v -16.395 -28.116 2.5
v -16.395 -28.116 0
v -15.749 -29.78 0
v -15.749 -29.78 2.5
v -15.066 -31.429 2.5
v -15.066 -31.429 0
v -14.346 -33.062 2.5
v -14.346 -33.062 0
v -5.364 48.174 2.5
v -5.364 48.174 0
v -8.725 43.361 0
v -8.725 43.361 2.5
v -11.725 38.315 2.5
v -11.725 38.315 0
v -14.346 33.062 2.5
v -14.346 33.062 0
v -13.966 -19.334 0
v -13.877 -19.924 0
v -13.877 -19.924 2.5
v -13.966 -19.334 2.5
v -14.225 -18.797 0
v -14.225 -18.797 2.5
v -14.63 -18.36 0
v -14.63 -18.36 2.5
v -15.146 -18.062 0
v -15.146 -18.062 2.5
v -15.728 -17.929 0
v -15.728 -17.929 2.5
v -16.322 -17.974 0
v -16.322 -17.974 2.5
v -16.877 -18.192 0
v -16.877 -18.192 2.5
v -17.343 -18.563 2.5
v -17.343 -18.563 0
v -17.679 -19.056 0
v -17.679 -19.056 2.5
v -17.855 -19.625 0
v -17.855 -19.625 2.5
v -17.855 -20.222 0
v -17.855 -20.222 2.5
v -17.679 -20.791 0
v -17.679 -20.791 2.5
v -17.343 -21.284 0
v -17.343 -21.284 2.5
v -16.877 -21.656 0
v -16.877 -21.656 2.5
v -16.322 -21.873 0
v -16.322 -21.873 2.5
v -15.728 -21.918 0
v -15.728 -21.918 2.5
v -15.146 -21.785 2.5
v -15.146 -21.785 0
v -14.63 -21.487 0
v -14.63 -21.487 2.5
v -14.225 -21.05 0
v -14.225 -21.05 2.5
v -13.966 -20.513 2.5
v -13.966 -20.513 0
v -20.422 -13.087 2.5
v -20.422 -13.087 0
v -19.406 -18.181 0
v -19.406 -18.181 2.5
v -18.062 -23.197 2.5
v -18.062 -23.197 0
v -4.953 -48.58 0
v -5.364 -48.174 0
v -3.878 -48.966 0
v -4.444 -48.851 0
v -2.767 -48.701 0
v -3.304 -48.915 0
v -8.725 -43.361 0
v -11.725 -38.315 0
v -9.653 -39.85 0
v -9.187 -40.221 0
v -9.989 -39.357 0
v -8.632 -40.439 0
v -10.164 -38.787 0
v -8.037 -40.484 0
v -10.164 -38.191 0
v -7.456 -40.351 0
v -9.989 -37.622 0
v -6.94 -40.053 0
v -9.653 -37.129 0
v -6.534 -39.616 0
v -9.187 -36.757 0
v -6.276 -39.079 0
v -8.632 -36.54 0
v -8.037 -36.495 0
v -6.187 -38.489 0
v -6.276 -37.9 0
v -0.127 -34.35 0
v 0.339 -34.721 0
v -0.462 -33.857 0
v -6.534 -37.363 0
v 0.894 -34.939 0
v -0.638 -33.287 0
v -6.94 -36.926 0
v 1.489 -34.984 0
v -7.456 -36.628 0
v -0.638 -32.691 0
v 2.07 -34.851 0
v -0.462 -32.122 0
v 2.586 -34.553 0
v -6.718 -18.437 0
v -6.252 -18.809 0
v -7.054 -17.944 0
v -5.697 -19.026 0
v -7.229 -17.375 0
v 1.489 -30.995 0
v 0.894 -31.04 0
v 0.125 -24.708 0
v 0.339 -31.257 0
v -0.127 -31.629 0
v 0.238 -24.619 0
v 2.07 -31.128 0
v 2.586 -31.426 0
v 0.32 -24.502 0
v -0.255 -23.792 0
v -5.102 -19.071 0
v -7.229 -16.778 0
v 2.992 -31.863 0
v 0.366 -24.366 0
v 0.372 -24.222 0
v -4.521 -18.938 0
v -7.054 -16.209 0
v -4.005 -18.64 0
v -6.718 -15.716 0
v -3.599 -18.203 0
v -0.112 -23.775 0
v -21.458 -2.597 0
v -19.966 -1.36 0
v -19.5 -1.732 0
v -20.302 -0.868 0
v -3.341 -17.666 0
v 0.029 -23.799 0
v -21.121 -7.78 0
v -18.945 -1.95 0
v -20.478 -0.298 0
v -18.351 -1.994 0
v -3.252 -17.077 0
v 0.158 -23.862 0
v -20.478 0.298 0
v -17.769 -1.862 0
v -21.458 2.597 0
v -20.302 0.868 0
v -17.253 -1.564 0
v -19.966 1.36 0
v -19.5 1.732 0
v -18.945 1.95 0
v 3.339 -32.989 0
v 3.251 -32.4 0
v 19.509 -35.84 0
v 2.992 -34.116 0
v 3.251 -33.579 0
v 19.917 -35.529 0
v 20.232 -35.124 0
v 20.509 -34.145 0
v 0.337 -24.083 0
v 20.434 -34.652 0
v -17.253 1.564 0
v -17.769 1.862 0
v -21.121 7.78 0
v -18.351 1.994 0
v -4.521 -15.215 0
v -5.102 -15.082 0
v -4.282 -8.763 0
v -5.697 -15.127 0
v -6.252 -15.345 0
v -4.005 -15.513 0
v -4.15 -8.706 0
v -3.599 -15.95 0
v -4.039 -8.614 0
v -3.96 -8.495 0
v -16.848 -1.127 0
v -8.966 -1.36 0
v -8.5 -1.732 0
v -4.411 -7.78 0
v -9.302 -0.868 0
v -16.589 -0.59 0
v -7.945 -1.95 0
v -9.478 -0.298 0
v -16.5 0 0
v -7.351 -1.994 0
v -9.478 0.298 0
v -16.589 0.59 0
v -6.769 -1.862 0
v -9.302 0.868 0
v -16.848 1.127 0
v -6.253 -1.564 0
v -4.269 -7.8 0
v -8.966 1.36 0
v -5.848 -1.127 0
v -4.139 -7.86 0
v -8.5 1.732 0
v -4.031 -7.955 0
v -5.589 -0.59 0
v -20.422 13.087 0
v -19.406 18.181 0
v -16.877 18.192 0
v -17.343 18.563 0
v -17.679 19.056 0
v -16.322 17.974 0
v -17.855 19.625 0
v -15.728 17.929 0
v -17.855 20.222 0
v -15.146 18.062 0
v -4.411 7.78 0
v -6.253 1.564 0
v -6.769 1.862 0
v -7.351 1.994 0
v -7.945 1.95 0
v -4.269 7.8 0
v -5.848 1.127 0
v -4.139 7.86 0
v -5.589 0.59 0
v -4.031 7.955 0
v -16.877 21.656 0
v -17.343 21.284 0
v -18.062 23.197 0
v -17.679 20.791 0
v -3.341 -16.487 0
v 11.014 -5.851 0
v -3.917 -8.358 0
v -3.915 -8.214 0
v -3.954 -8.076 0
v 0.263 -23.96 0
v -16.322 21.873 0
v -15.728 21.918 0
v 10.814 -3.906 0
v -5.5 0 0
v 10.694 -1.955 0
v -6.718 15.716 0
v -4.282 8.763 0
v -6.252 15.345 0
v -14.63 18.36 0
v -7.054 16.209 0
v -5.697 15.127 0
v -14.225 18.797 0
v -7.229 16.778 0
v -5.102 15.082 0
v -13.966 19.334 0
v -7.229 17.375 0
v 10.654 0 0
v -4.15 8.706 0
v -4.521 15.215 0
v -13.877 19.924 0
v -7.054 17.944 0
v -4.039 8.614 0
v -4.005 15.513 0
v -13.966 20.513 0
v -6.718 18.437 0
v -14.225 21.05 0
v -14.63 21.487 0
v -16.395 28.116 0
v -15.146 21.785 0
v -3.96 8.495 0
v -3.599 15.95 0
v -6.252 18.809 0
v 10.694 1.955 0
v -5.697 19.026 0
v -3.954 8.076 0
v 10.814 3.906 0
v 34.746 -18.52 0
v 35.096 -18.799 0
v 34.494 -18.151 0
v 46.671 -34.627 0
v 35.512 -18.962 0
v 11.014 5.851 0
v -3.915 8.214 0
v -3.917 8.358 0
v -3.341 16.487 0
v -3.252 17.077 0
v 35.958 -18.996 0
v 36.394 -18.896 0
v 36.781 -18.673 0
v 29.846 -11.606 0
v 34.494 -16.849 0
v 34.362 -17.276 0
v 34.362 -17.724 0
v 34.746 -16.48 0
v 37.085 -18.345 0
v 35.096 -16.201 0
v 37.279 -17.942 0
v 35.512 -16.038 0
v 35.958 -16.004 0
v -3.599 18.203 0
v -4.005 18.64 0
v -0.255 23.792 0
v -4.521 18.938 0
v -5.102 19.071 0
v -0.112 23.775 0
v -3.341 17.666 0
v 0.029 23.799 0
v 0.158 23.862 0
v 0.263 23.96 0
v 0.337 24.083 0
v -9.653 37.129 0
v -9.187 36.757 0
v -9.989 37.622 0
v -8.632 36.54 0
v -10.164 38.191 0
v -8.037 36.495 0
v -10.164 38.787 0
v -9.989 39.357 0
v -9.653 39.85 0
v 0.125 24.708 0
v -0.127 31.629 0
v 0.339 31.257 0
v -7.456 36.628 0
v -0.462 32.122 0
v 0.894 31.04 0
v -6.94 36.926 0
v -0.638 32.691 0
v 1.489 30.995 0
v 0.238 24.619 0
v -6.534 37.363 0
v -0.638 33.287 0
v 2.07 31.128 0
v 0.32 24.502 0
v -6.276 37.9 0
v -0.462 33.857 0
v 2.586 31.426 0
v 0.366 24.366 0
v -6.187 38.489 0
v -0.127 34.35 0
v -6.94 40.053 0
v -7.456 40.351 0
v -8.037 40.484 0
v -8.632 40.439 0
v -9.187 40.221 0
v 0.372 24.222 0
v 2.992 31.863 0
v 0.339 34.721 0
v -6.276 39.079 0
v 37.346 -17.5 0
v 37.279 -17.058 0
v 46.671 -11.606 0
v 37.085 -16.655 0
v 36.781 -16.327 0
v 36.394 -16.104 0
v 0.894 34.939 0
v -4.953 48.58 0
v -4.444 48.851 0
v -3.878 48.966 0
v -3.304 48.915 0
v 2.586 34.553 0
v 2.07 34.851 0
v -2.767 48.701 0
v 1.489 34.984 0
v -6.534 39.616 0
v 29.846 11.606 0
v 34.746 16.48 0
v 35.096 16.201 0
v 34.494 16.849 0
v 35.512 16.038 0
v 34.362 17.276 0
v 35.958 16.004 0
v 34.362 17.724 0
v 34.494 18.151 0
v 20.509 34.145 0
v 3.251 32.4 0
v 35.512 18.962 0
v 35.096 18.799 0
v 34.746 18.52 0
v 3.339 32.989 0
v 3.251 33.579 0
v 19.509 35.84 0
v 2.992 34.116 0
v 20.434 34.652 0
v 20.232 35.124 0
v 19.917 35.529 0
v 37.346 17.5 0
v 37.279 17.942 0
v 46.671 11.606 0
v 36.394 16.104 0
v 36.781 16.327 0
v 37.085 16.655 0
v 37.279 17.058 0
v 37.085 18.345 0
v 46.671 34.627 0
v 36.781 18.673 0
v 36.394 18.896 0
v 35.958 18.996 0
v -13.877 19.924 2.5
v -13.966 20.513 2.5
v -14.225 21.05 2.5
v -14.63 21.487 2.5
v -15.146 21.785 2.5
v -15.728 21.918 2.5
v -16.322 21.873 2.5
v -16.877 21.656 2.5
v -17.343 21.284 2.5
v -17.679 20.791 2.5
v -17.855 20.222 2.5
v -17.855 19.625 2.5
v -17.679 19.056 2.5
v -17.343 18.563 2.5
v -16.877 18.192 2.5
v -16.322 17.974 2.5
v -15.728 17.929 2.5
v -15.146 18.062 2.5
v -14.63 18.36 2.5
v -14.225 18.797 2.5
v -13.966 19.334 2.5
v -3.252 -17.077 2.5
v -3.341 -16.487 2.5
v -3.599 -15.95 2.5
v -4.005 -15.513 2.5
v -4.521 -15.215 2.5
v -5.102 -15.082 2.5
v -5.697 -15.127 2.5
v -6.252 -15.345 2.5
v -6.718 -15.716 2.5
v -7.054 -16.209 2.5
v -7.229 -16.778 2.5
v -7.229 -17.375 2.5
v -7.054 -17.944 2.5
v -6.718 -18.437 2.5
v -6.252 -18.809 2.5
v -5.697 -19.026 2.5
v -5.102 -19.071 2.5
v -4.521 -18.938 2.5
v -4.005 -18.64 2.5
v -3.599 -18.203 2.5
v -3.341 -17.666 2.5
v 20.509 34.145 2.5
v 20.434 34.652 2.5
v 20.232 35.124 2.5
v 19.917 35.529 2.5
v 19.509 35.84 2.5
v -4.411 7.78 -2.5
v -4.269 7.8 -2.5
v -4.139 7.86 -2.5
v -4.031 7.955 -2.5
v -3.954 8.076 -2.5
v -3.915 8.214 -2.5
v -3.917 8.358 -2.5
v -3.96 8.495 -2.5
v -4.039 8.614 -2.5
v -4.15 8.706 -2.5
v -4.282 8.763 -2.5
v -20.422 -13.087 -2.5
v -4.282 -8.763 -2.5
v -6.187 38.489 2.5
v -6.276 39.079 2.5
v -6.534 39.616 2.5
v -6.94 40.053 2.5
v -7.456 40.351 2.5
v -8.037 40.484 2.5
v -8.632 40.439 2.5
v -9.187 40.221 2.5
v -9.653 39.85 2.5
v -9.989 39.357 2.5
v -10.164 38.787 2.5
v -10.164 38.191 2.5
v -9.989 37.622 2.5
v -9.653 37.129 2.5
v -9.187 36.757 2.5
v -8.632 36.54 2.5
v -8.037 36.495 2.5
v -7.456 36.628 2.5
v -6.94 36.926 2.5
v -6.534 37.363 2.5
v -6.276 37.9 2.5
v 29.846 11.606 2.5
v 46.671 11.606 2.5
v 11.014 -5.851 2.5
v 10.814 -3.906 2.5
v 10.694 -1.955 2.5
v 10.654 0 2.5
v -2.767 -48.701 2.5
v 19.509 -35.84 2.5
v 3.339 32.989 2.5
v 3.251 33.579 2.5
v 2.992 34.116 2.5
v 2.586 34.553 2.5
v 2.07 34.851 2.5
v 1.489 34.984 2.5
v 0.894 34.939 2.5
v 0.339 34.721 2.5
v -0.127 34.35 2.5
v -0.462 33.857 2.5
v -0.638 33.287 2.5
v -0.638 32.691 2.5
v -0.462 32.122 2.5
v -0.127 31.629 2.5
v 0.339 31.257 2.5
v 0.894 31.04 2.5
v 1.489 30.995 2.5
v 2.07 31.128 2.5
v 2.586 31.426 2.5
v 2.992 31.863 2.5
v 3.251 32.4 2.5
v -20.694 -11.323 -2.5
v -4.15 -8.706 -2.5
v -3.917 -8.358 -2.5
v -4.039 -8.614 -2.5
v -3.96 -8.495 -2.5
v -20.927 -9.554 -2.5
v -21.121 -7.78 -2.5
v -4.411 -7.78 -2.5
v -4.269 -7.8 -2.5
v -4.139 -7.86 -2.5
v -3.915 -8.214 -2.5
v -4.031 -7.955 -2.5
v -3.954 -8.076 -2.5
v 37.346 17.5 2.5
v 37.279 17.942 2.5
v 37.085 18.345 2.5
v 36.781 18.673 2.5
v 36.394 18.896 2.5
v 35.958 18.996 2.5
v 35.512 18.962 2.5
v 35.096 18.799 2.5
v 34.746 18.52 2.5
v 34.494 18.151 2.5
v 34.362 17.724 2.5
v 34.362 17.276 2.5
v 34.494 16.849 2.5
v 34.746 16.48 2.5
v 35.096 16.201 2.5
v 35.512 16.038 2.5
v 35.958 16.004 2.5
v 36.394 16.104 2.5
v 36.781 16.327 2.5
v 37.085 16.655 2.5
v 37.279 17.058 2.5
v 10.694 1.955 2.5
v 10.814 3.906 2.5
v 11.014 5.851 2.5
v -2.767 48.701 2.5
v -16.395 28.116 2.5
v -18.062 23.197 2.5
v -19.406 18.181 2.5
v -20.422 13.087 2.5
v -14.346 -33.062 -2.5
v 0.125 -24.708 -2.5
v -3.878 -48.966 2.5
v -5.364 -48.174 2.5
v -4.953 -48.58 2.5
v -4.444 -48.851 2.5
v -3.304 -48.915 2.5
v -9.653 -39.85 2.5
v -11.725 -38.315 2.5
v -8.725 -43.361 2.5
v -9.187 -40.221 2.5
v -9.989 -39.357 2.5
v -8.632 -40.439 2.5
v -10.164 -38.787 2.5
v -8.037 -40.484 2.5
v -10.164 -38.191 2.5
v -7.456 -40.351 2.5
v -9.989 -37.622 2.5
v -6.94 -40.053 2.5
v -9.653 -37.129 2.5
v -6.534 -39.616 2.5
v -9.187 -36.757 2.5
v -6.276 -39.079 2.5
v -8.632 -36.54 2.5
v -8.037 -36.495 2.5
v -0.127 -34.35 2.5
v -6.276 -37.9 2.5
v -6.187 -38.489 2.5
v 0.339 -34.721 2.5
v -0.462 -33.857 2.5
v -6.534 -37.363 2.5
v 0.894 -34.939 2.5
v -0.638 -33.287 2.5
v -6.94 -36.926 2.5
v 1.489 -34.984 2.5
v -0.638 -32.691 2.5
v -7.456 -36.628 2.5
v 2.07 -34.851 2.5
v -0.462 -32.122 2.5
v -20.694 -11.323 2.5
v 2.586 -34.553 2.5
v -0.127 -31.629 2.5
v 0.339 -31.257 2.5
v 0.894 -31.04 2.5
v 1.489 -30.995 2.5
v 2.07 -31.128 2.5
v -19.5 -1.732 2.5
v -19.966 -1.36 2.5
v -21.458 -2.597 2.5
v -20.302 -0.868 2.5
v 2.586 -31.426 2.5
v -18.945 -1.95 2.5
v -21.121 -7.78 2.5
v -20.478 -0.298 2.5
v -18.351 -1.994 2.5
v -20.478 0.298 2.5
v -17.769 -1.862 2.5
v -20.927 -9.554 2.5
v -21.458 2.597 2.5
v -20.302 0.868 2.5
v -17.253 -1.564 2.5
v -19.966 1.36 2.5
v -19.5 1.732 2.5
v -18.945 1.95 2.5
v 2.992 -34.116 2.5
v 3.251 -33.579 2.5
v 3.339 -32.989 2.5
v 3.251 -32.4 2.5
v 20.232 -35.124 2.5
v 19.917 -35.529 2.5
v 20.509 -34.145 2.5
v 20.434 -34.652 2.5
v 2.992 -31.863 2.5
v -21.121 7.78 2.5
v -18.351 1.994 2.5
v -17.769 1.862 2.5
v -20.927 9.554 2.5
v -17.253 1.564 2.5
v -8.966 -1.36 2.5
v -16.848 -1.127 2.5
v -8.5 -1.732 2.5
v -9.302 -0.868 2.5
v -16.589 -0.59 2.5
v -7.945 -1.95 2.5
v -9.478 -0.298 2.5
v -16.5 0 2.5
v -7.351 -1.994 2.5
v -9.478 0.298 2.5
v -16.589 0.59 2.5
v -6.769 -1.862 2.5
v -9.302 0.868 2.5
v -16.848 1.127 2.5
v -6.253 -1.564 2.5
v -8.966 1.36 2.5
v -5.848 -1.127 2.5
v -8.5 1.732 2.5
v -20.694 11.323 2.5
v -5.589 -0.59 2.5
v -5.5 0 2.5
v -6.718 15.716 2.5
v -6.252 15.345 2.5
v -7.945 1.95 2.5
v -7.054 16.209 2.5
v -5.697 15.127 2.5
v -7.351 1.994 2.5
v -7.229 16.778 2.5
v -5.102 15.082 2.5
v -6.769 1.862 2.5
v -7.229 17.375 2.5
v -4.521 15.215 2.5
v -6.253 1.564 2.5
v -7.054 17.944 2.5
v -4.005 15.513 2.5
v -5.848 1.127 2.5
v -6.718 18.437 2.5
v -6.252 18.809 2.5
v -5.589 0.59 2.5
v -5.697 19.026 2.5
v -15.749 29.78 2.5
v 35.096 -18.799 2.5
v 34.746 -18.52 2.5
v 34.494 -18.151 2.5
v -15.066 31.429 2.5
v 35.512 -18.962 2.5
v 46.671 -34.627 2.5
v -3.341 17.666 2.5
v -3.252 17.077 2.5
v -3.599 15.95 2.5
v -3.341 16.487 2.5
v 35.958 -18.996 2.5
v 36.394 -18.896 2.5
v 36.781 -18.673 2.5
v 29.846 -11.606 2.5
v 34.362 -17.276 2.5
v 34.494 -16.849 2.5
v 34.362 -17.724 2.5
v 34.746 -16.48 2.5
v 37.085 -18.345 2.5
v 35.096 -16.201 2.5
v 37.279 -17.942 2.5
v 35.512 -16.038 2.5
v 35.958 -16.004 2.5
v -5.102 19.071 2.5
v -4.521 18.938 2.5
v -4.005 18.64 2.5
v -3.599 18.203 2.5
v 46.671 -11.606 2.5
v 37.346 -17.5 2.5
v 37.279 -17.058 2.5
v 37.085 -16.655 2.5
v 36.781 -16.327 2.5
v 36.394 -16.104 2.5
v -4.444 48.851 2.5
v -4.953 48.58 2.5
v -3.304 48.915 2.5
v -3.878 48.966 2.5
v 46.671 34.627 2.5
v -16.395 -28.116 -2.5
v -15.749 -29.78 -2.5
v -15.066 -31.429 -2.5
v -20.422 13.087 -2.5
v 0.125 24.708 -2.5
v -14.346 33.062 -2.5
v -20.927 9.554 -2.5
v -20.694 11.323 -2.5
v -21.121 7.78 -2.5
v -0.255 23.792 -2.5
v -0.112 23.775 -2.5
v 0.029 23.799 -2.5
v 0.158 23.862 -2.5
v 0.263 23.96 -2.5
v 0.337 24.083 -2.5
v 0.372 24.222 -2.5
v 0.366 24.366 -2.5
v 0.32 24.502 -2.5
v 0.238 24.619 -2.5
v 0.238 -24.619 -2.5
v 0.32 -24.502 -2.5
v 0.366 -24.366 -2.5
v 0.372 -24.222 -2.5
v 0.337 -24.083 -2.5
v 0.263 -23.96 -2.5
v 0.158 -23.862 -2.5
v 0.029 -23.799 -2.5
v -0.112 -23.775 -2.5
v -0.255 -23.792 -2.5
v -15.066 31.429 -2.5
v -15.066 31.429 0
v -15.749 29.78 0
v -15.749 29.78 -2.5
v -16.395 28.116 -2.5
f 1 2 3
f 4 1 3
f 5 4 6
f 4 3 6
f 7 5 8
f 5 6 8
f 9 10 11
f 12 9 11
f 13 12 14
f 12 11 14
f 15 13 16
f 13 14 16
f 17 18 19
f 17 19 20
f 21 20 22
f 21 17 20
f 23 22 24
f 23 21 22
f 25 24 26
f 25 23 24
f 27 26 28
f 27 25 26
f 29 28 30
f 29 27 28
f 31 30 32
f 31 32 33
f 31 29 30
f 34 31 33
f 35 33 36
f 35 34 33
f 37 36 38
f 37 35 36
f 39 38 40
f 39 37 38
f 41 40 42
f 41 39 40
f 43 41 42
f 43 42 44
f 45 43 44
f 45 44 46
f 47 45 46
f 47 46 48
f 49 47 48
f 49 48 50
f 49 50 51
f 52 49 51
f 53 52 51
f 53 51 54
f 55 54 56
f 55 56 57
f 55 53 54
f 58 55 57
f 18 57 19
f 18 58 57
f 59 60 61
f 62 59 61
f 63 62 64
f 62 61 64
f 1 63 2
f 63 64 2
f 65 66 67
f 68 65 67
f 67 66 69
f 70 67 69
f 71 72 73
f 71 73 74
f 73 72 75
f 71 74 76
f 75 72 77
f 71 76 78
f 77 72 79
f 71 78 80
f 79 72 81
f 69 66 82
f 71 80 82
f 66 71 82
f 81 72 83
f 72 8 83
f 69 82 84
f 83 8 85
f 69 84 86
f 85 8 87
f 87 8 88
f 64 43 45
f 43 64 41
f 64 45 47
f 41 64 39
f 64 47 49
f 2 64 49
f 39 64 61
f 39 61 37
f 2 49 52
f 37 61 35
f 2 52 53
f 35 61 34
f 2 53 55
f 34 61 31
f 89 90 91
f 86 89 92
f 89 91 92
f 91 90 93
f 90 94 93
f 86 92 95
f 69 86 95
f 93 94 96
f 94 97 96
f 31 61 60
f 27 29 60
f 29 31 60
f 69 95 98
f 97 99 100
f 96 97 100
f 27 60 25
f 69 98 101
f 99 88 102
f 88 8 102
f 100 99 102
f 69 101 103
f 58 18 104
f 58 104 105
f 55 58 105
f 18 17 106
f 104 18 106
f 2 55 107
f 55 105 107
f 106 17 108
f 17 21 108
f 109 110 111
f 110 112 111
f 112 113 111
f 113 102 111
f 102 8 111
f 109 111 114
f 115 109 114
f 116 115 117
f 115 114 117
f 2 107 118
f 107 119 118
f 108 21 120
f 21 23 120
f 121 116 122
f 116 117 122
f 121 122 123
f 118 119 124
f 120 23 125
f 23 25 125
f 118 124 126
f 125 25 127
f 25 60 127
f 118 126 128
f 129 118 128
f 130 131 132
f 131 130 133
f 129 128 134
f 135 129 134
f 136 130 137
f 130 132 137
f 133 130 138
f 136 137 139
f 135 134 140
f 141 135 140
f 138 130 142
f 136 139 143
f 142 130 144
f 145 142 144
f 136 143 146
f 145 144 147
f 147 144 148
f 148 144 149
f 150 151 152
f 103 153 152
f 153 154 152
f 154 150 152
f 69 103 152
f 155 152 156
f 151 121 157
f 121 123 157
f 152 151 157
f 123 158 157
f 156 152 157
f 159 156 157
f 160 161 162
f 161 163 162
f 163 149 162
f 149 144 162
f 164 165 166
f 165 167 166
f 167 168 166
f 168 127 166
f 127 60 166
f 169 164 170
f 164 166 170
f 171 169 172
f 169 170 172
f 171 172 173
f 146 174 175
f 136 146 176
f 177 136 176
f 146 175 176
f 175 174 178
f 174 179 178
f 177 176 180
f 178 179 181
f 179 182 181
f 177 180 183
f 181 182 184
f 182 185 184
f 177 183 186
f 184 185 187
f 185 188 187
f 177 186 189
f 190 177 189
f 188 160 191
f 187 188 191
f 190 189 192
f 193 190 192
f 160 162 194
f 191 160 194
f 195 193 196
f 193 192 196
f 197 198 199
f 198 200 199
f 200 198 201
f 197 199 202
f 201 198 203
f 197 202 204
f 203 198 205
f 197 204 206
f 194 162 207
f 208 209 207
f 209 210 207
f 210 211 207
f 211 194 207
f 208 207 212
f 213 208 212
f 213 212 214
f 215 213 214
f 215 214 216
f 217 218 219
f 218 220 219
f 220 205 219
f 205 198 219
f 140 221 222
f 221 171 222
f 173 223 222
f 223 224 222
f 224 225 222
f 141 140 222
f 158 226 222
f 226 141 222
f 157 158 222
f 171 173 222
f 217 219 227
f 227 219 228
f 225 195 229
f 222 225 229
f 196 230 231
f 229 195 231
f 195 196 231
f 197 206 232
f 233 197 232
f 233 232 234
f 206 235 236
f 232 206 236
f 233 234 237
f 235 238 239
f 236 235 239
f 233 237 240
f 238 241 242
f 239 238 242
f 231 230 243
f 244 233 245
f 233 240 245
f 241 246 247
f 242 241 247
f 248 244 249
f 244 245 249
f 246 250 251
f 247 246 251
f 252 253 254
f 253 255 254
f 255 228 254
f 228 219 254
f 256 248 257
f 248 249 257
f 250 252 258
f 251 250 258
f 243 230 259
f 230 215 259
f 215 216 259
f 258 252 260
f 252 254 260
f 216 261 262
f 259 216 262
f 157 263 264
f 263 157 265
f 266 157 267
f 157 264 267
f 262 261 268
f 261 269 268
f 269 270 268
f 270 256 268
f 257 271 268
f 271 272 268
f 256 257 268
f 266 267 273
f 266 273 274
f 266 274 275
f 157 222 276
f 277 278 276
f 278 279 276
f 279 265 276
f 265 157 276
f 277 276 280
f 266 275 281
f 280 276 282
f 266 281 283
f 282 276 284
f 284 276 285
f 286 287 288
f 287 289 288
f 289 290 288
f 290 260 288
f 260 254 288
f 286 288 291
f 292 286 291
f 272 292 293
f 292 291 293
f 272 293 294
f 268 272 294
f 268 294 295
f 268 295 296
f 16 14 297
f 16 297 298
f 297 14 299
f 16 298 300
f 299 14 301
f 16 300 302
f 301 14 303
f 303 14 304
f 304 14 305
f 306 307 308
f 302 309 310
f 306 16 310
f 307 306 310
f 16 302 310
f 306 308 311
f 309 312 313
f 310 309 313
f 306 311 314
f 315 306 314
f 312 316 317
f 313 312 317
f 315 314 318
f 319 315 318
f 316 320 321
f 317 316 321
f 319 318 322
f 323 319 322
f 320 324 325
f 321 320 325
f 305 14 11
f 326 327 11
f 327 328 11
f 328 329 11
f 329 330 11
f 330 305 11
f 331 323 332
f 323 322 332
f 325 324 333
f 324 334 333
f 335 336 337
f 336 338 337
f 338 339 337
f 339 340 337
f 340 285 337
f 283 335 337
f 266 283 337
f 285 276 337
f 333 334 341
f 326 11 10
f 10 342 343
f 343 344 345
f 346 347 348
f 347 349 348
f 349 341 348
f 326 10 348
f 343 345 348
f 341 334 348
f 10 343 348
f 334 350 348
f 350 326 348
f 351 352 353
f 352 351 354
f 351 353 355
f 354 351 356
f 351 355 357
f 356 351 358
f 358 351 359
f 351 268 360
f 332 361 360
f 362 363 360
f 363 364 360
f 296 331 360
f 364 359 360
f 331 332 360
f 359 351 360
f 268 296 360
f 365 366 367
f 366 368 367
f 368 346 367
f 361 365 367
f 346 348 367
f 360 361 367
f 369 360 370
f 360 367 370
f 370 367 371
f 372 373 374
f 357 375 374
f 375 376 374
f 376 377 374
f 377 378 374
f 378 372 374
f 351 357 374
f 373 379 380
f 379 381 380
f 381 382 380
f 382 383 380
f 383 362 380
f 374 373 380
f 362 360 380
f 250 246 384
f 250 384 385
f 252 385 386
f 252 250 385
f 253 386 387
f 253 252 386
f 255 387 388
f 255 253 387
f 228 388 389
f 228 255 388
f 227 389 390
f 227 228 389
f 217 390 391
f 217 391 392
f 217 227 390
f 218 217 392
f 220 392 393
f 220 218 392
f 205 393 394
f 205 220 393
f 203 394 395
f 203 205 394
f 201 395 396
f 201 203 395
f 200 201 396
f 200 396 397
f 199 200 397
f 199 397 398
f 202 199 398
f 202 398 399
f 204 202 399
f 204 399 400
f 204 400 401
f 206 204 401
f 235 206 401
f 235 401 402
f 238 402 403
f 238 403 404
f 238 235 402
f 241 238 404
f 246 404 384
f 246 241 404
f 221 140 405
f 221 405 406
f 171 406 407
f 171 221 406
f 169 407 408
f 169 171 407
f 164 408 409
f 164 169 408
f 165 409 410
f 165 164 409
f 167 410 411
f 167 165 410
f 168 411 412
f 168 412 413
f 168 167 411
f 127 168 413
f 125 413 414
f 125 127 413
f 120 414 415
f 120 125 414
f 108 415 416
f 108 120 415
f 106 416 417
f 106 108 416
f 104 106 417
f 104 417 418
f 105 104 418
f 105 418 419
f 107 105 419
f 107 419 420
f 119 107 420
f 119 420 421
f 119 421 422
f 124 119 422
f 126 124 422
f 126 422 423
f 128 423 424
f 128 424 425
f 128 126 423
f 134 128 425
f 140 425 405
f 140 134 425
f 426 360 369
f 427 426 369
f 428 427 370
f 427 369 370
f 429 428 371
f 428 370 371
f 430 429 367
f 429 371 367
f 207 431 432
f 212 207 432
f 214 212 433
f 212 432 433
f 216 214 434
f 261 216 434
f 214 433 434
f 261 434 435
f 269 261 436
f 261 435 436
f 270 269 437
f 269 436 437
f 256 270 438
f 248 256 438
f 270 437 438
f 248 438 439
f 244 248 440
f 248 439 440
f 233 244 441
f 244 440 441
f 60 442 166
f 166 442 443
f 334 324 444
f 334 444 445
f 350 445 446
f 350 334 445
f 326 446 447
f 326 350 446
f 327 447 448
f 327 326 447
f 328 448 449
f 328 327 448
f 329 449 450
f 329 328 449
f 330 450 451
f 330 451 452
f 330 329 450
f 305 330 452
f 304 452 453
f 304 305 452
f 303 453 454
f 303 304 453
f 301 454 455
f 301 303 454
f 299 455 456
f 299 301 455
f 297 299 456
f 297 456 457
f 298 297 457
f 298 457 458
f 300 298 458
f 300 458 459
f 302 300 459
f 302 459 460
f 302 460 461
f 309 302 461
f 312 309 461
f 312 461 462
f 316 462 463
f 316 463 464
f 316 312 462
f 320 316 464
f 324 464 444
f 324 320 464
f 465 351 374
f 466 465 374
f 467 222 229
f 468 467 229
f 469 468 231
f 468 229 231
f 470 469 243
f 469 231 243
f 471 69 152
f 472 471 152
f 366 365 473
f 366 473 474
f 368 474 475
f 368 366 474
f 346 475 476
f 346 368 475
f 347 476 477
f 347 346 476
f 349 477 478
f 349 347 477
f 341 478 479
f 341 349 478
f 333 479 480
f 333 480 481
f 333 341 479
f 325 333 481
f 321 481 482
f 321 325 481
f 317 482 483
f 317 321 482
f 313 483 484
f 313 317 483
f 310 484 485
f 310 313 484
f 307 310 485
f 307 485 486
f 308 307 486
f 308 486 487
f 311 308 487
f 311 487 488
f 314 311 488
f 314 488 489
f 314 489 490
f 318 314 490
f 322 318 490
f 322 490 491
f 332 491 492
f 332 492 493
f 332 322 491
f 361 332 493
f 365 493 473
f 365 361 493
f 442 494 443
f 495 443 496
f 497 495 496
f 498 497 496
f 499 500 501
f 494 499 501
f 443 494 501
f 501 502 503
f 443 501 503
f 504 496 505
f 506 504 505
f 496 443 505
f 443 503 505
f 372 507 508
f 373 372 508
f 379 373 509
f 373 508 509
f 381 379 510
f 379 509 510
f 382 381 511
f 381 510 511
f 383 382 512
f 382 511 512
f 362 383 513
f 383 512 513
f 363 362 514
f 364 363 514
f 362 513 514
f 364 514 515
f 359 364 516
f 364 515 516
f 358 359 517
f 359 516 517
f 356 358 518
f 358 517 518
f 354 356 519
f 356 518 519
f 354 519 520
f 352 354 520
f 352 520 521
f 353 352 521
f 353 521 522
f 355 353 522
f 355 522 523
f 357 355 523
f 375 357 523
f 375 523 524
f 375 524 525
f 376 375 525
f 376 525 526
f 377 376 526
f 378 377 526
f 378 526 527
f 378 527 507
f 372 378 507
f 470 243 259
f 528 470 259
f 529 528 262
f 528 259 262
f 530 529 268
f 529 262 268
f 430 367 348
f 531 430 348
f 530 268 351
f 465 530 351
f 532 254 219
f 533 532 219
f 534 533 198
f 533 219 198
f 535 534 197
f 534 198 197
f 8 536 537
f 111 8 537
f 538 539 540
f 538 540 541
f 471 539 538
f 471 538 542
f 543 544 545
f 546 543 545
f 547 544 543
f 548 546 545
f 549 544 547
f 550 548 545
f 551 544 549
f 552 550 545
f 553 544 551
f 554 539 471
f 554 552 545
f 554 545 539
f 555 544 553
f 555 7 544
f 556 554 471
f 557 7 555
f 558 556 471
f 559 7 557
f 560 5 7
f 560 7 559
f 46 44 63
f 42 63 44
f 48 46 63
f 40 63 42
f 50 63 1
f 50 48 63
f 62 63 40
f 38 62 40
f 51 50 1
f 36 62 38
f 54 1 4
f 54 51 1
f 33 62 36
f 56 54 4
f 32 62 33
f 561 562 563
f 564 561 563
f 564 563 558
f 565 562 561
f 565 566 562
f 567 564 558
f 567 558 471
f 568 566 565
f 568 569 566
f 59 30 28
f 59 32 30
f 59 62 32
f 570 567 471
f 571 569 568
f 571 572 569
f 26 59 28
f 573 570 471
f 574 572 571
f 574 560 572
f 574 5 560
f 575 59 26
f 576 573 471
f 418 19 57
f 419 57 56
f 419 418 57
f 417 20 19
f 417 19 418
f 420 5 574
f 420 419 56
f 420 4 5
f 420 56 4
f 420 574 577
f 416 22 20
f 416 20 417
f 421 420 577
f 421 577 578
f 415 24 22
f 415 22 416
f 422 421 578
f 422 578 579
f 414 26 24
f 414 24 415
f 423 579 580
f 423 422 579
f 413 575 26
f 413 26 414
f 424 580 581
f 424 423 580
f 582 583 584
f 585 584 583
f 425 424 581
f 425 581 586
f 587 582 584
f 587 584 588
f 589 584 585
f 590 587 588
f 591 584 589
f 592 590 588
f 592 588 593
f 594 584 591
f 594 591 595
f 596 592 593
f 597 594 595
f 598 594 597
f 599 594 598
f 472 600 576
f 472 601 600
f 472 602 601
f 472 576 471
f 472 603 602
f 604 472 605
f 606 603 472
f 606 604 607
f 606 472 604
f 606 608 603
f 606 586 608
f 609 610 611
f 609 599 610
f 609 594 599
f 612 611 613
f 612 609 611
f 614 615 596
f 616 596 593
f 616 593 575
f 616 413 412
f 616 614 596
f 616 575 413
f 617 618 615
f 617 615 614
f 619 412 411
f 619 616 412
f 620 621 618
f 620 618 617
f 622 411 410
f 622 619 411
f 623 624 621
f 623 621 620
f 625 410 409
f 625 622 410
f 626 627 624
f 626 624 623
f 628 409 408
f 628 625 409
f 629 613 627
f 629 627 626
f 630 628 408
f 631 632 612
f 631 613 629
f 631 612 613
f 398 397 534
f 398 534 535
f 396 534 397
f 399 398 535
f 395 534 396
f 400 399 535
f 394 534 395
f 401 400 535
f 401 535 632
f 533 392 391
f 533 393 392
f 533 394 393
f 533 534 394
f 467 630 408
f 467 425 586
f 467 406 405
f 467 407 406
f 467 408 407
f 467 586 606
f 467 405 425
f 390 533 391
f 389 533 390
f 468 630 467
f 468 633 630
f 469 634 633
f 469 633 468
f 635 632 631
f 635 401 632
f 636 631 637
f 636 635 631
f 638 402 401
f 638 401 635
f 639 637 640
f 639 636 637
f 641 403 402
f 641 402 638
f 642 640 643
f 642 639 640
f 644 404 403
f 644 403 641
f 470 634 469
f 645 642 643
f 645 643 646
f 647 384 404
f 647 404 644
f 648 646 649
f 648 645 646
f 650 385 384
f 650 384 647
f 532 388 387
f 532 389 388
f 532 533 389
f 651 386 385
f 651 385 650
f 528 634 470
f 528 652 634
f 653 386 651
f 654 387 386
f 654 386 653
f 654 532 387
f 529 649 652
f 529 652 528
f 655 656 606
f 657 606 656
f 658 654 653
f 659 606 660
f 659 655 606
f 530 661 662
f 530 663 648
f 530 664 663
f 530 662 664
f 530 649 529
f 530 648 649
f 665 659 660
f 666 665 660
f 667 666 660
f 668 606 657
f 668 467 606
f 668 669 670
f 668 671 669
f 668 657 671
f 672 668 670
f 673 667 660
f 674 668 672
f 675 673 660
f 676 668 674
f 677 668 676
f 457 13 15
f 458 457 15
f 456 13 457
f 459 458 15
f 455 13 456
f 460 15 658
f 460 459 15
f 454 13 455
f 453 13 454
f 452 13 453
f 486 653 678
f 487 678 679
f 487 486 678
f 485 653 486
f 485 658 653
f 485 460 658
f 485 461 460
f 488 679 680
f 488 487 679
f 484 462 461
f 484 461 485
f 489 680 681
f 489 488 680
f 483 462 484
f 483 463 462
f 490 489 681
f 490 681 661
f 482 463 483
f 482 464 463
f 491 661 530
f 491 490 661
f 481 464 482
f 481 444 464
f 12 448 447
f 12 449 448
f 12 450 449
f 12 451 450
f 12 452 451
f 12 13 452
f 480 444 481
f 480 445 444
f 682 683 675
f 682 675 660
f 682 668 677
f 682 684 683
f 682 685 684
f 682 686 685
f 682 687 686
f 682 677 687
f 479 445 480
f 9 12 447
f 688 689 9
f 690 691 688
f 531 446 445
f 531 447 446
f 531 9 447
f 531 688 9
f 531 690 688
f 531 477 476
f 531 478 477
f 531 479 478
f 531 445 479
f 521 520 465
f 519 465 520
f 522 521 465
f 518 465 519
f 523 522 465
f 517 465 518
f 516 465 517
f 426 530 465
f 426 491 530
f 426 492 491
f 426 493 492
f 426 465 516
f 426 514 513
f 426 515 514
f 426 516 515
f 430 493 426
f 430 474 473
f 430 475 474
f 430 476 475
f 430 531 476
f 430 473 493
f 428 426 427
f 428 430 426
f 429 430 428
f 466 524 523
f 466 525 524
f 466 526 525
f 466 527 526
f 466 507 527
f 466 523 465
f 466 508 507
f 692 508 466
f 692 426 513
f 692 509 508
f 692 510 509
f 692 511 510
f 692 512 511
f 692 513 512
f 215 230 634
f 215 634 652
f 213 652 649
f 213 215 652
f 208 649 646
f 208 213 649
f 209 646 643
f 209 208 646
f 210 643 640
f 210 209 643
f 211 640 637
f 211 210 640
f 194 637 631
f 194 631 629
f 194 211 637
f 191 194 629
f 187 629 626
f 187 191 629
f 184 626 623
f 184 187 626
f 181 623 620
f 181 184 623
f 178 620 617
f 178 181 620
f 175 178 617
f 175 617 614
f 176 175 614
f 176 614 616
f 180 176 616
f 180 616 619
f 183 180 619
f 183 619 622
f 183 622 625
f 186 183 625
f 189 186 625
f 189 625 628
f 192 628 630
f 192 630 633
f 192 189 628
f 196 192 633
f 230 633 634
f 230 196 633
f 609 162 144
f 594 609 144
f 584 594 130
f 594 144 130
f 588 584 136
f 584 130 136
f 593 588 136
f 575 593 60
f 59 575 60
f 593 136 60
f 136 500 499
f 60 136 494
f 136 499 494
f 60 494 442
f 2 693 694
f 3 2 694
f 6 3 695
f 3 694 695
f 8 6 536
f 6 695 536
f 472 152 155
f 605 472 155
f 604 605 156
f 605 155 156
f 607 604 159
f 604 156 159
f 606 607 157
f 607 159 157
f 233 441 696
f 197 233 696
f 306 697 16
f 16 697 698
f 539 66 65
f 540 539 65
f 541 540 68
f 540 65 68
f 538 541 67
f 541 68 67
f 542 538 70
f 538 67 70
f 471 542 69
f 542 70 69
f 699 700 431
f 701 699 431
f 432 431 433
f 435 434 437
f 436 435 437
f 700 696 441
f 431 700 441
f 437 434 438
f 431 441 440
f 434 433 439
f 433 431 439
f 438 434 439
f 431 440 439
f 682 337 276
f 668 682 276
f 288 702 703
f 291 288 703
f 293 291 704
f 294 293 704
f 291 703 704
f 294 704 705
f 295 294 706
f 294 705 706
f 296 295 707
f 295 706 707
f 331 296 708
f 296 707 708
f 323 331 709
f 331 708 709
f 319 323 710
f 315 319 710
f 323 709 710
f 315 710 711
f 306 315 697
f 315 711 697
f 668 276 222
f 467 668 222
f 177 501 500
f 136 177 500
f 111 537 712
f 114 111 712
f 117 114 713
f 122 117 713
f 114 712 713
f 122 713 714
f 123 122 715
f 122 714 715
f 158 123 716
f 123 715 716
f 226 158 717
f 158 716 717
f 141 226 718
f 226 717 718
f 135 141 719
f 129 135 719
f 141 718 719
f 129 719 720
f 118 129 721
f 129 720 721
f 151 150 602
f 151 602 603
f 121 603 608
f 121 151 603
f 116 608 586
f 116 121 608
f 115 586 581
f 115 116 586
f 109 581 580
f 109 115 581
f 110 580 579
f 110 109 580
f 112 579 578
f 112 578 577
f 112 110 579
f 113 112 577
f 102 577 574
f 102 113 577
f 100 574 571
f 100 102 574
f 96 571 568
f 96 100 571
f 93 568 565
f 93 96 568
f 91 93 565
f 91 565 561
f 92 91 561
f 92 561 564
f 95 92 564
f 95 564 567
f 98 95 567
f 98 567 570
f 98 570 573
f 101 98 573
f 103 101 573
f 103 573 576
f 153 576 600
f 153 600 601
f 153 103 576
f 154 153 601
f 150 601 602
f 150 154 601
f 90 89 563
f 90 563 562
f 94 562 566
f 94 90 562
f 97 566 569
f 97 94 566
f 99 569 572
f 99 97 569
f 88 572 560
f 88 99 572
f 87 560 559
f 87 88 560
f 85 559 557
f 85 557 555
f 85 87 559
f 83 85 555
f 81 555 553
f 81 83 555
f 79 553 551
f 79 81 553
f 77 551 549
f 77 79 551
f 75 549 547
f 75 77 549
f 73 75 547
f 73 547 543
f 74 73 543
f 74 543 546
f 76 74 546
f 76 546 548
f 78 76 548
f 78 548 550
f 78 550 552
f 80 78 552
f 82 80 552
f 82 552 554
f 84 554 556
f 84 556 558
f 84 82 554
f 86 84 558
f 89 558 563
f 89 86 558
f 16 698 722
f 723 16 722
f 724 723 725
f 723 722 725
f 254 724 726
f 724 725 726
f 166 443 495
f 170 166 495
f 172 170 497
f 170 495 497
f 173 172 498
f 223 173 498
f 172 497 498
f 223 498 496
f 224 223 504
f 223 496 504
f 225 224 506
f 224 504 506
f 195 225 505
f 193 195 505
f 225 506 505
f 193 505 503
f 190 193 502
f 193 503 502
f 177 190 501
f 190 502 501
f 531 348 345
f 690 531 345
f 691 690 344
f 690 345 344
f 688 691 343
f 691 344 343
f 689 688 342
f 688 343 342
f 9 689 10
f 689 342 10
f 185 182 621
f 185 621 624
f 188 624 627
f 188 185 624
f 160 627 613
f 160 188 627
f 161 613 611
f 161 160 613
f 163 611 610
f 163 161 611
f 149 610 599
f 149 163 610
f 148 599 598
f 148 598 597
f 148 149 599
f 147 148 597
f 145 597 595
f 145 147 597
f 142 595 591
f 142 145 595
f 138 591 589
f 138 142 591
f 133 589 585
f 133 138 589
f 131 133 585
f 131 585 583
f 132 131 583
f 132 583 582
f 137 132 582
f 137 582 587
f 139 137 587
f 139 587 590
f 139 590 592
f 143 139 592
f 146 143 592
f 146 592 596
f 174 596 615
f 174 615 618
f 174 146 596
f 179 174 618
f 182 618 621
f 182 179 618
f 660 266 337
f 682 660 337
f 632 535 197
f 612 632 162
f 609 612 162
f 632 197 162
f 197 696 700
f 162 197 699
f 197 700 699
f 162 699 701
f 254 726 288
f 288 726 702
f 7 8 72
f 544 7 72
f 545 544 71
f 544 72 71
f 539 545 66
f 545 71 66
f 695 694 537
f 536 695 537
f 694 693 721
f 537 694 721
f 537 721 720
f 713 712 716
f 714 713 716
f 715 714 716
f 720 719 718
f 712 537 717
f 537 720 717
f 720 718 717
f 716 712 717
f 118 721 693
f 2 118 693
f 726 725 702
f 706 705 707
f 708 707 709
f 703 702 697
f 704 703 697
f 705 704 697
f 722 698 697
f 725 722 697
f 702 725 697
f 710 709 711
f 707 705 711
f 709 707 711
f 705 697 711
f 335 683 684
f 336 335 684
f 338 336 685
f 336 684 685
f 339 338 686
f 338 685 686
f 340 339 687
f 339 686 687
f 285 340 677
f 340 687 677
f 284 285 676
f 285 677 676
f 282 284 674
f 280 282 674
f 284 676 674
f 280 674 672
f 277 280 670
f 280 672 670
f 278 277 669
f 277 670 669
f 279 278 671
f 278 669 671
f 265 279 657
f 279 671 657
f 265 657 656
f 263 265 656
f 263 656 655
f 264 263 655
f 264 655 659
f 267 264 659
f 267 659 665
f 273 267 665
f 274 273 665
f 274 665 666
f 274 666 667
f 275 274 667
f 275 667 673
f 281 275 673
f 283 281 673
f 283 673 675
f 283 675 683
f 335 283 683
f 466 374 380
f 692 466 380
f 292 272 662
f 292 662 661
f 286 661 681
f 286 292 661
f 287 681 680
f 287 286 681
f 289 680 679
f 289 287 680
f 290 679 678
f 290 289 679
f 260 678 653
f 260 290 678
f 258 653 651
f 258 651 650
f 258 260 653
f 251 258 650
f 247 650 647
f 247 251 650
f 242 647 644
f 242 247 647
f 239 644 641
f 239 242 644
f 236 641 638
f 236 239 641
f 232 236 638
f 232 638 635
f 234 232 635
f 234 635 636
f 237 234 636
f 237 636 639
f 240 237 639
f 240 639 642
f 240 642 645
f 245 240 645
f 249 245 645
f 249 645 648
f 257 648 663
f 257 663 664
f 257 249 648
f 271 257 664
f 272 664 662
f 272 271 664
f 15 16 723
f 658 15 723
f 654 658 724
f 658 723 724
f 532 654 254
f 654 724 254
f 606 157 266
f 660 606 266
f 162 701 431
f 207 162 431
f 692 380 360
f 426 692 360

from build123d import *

# Parameters (mm, degrees)
CROQUIS1_R              = 2
SALIENTE_EXTRUIR1_DEPTH = 2.5
SALIENTE_EXTRUIR2_START = -2.5
SALIENTE_EXTRUIR2_DEPTH = 2.5
SALIENTE_EXTRUIR3_START = -2.5
SALIENTE_EXTRUIR3_DEPTH = 2.5
CROQUIS3_R              = 1.5
CORTAR_EXTRUIR1_DEPTH   = 10


# Read off the part's stored shape, not the designer's step: Saliente-Extruir2
with BuildPart() as part:
    # Croquis1 → Saliente-Extruir1 (new body)
    # profile 1 of 5: a face of its own
    with BuildSketch(Plane.XY):
        with BuildLine():
            Line((-21.120737491, -7.779592428), (-4.410977671, -7.779592428))
            ThreePointArc((-4.410977671, -7.779592428), (-3.91525524, -8.214329332), (-4.281568148, -8.762555341))
            Line((-4.281568148, -8.762555341), (-20.42195671, -13.087359421))
            ThreePointArc((-20.42195671, -13.087359421), (-18.774789479, -20.700029026), (-16.394943343, -28.116377909))
            Line((-16.394943343, -28.116377909), (-0.254554781, -23.791573829))
            ThreePointArc((-0.254554781, -23.791573829), (0.336794507, -24.083195026), (0.124854741, -24.707549444))
            Line((0.124854741, -24.707549444), (-14.346221754, -33.062429354))
            ThreePointArc((-14.346221754, -33.062429354), (-10.27145788, -40.865753752), (-5.363777272, -48.173984957))
            ThreePointArc((-5.363777272, -48.173984957), (-4.165388027, -48.929294708), (-2.76728992, -48.70136646))
            Line((-2.76728992, -48.70136646), (19.509218146, -35.840018532))
            ThreePointArc((19.509218146, -35.840018532), (20.480258523, -34.447083978), (20.030579853, -32.809715608))
            ThreePointArc((20.030579853, -32.809715608), (7.934326683, 0), (20.030579853, 32.809715608))
            ThreePointArc((20.030579853, 32.809715608), (20.480258523, 34.447083978), (19.509218146, 35.840018532))
            Line((19.509218146, 35.840018532), (-2.76728992, 48.70136646))
            ThreePointArc((-2.76728992, 48.70136646), (-4.165388027, 48.929294708), (-5.363777272, 48.173984957))
            ThreePointArc((-5.363777272, 48.173984957), (-10.27145788, 40.865753752), (-14.346221754, 33.062429354))
            Line((-14.346221754, 33.062429354), (0.124854741, 24.707549444))
            ThreePointArc((0.124854741, 24.707549444), (0.336794507, 24.083195026), (-0.254554781, 23.791573829))
            Line((-0.254554781, 23.791573829), (-16.394943343, 28.116377909))
            ThreePointArc((-16.394943343, 28.116377909), (-18.774789479, 20.700029026), (-20.42195671, 13.087359421))
            Line((-20.42195671, 13.087359421), (-4.281568148, 8.762555341))
            ThreePointArc((-4.281568148, 8.762555341), (-3.91525524, 8.214329332), (-4.410977671, 7.779592428))
            Line((-4.410977671, 7.779592428), (-21.120737491, 7.779592428))
            ThreePointArc((-21.120737491, 7.779592428), (-21.5, 0), (-21.120737491, -7.779592428))
        make_face()
        with Locations((-8.186800297, -38.489385282)):
            Circle(CROQUIS1_R, mode=Mode.SUBTRACT)
        with Locations((-15.877012, -19.92357189)):
            Circle(CROQUIS1_R, mode=Mode.SUBTRACT)
        with Locations((-5.251827911, -17.076562394)):
            Circle(CROQUIS1_R, mode=Mode.SUBTRACT)
        with Locations((1.339479145, -32.989385282)):
            Circle(CROQUIS1_R, mode=Mode.SUBTRACT)
        with Locations((-18.5, 0)):
            Circle(CROQUIS1_R, mode=Mode.SUBTRACT)
        with Locations((-15.877012, 19.92357189)):
            Circle(CROQUIS1_R, mode=Mode.SUBTRACT)
        with Locations((-7.5, 0)):
            Circle(CROQUIS1_R, mode=Mode.SUBTRACT)
        with Locations((-5.251827911, 17.076562394)):
            Circle(CROQUIS1_R, mode=Mode.SUBTRACT)
        with Locations((-8.186800297, 38.489385282)):
            Circle(CROQUIS1_R, mode=Mode.SUBTRACT)
        with Locations((1.339479145, 32.989385282)):
            Circle(CROQUIS1_R, mode=Mode.SUBTRACT)
    # profile 2 of 5: a face of its own
    with BuildSketch(Plane.XY):
        with BuildLine():
            ThreePointArc((-14.346221754, 33.062429354), (-15.411978596, 30.606550436), (-16.394943343, 28.116377909))
            Line((-16.394943343, 28.116377909), (-0.254554781, 23.791573829))
            ThreePointArc((-0.254554781, 23.791573829), (0.336794507, 24.083195026), (0.124854741, 24.707549444))
            Line((0.124854741, 24.707549444), (-14.346221754, 33.062429354))
        make_face()
    # profile 3 of 5: a face of its own
    with BuildSketch(Plane.XY):
        with BuildLine():
            ThreePointArc((-20.42195671, 13.087359421), (-20.815770531, 10.43932438), (-21.120737491, 7.779592428))
            Line((-21.120737491, 7.779592428), (-4.410977671, 7.779592428))
            ThreePointArc((-4.410977671, 7.779592428), (-3.91525524, 8.214329332), (-4.281568148, 8.762555341))
            Line((-4.281568148, 8.762555341), (-20.42195671, 13.087359421))
        make_face()
    # profile 4 of 5: a face of its own
    with BuildSketch(Plane.XY):
        with BuildLine():
            ThreePointArc((-4.281568148, -8.762555341), (-3.91525524, -8.214329332), (-4.410977671, -7.779592428))
            Line((-4.410977671, -7.779592428), (-21.120737491, -7.779592428))
            ThreePointArc((-21.120737491, -7.779592428), (-20.815770531, -10.43932438), (-20.42195671, -13.087359421))
            Line((-20.42195671, -13.087359421), (-4.281568148, -8.762555341))
        make_face()
    # profile 5 of 5: a face of its own
    with BuildSketch(Plane.XY):
        with BuildLine():
            Line((-0.254554781, -23.791573829), (-16.394943343, -28.116377909))
            ThreePointArc((-16.394943343, -28.116377909), (-15.411978596, -30.606550436), (-14.346221754, -33.062429354))
            Line((-14.346221754, -33.062429354), (0.124854741, -24.707549444))
            ThreePointArc((0.124854741, -24.707549444), (0.336794507, -24.083195026), (-0.254554781, -23.791573829))
        make_face()
    extrude(amount=SALIENTE_EXTRUIR1_DEPTH)

    # Saliente-Extruir2 outline → Saliente-Extruir2 (add)
    with BuildSketch(Plane.XY.offset(SALIENTE_EXTRUIR2_START)):
        with BuildLine():
            Line((-0.254554781, -23.791573829), (-16.394943343, -28.116377909))
            ThreePointArc((-16.394943343, -28.116377909), (-15.411978595, -30.606550436), (-14.346221754, -33.062429354))
            Line((-14.346221754, -33.062429354), (0.124854741, -24.707549444))
            ThreePointArc((0.124854741, -24.707549444), (0.336794507, -24.083195026), (-0.254554781, -23.791573829))
        make_face()
        with BuildLine():
            Line((-4.410977671, -7.779592428), (-21.120737491, -7.779592428))
            ThreePointArc((-21.120737491, -7.779592428), (-20.815770531, -10.43932438), (-20.42195671, -13.087359421))
            Line((-20.42195671, -13.087359421), (-4.281568148, -8.762555341))
            ThreePointArc((-4.281568148, -8.762555341), (-3.91525524, -8.214329332), (-4.410977671, -7.779592428))
        make_face()
        with BuildLine():
            Line((-4.281568148, 8.762555341), (-20.42195671, 13.087359421))
            ThreePointArc((-20.42195671, 13.087359421), (-20.815770531, 10.43932438), (-21.120737491, 7.779592428))
            Line((-21.120737491, 7.779592428), (-4.410977671, 7.779592428))
            ThreePointArc((-4.410977671, 7.779592428), (-3.91525524, 8.214329332), (-4.281568148, 8.762555341))
        make_face()
        with BuildLine():
            Line((-16.394943343, 28.116377909), (-0.254554781, 23.791573829))
            ThreePointArc((-0.254554781, 23.791573829), (0.336794507, 24.083195026), (0.124854741, 24.707549444))
            Line((0.124854741, 24.707549444), (-14.346221754, 33.062429354))
            ThreePointArc((-14.346221754, 33.062429354), (-15.411978595, 30.606550436), (-16.394943343, 28.116377909))
        make_face()
    extrude(amount=SALIENTE_EXTRUIR2_DEPTH)

    # Croquis2 → Saliente-Extruir3 (add)
    with BuildSketch(Plane.XY.offset(2.5).offset(SALIENTE_EXTRUIR3_START)):
        with BuildLine():
            ThreePointArc((20.030579853, 32.809715608), (11.054709029, 17.484255625), (7.934326683, 0))
            Line((7.934326683, 0), (10.654225828, 0))
            ThreePointArc((10.654225828, 0), (10.744136996, 2.931183608), (11.013532431, 5.85134584))
            Line((11.013532431, 5.85134584), (29.845645811, 11.606363843))
            Line((29.845645811, 11.606363843), (46.670524679, 11.606363843))
            Line((46.670524679, 11.606363843), (46.670524679, 34.626841689))
            Line((46.670524679, 34.626841689), (20.50887875, 34.144811605))
            ThreePointArc((20.50887875, 34.144811605), (20.392040458, 33.433445566), (20.030579853, 32.809715608))
        make_face()
        with BuildLine():
            Line((10.654225828, 0), (7.934326683, 0))
            ThreePointArc((7.934326683, 0), (11.054709029, -17.484255625), (20.030579853, -32.809715608))
            ThreePointArc((20.030579853, -32.809715608), (20.392040458, -33.433445566), (20.50887875, -34.144811605))
            Line((20.50887875, -34.144811605), (46.670524679, -34.626841689))
            Line((46.670524679, -34.626841689), (46.670524679, -11.606363843))
            Line((46.670524679, -11.606363843), (29.845645811, -11.606363843))
            Line((29.845645811, -11.606363843), (11.013532431, -5.85134584))
            ThreePointArc((11.013532431, -5.85134584), (10.744136996, -2.931183608), (10.654225828, 0))
        make_face()
    extrude(amount=SALIENTE_EXTRUIR3_DEPTH)

    # Croquis3 → Cortar-Extruir1 (cut)
    with BuildSketch(Plane.XY.offset(2.5)):
        with Locations((35.845645811, -17.5)):
            Circle(CROQUIS3_R)
        with Locations((35.845645811, 17.5)):
            Circle(CROQUIS3_R)
    extrude(amount=-CORTAR_EXTRUIR1_DEPTH, mode=Mode.SUBTRACT)


solid = part.part
